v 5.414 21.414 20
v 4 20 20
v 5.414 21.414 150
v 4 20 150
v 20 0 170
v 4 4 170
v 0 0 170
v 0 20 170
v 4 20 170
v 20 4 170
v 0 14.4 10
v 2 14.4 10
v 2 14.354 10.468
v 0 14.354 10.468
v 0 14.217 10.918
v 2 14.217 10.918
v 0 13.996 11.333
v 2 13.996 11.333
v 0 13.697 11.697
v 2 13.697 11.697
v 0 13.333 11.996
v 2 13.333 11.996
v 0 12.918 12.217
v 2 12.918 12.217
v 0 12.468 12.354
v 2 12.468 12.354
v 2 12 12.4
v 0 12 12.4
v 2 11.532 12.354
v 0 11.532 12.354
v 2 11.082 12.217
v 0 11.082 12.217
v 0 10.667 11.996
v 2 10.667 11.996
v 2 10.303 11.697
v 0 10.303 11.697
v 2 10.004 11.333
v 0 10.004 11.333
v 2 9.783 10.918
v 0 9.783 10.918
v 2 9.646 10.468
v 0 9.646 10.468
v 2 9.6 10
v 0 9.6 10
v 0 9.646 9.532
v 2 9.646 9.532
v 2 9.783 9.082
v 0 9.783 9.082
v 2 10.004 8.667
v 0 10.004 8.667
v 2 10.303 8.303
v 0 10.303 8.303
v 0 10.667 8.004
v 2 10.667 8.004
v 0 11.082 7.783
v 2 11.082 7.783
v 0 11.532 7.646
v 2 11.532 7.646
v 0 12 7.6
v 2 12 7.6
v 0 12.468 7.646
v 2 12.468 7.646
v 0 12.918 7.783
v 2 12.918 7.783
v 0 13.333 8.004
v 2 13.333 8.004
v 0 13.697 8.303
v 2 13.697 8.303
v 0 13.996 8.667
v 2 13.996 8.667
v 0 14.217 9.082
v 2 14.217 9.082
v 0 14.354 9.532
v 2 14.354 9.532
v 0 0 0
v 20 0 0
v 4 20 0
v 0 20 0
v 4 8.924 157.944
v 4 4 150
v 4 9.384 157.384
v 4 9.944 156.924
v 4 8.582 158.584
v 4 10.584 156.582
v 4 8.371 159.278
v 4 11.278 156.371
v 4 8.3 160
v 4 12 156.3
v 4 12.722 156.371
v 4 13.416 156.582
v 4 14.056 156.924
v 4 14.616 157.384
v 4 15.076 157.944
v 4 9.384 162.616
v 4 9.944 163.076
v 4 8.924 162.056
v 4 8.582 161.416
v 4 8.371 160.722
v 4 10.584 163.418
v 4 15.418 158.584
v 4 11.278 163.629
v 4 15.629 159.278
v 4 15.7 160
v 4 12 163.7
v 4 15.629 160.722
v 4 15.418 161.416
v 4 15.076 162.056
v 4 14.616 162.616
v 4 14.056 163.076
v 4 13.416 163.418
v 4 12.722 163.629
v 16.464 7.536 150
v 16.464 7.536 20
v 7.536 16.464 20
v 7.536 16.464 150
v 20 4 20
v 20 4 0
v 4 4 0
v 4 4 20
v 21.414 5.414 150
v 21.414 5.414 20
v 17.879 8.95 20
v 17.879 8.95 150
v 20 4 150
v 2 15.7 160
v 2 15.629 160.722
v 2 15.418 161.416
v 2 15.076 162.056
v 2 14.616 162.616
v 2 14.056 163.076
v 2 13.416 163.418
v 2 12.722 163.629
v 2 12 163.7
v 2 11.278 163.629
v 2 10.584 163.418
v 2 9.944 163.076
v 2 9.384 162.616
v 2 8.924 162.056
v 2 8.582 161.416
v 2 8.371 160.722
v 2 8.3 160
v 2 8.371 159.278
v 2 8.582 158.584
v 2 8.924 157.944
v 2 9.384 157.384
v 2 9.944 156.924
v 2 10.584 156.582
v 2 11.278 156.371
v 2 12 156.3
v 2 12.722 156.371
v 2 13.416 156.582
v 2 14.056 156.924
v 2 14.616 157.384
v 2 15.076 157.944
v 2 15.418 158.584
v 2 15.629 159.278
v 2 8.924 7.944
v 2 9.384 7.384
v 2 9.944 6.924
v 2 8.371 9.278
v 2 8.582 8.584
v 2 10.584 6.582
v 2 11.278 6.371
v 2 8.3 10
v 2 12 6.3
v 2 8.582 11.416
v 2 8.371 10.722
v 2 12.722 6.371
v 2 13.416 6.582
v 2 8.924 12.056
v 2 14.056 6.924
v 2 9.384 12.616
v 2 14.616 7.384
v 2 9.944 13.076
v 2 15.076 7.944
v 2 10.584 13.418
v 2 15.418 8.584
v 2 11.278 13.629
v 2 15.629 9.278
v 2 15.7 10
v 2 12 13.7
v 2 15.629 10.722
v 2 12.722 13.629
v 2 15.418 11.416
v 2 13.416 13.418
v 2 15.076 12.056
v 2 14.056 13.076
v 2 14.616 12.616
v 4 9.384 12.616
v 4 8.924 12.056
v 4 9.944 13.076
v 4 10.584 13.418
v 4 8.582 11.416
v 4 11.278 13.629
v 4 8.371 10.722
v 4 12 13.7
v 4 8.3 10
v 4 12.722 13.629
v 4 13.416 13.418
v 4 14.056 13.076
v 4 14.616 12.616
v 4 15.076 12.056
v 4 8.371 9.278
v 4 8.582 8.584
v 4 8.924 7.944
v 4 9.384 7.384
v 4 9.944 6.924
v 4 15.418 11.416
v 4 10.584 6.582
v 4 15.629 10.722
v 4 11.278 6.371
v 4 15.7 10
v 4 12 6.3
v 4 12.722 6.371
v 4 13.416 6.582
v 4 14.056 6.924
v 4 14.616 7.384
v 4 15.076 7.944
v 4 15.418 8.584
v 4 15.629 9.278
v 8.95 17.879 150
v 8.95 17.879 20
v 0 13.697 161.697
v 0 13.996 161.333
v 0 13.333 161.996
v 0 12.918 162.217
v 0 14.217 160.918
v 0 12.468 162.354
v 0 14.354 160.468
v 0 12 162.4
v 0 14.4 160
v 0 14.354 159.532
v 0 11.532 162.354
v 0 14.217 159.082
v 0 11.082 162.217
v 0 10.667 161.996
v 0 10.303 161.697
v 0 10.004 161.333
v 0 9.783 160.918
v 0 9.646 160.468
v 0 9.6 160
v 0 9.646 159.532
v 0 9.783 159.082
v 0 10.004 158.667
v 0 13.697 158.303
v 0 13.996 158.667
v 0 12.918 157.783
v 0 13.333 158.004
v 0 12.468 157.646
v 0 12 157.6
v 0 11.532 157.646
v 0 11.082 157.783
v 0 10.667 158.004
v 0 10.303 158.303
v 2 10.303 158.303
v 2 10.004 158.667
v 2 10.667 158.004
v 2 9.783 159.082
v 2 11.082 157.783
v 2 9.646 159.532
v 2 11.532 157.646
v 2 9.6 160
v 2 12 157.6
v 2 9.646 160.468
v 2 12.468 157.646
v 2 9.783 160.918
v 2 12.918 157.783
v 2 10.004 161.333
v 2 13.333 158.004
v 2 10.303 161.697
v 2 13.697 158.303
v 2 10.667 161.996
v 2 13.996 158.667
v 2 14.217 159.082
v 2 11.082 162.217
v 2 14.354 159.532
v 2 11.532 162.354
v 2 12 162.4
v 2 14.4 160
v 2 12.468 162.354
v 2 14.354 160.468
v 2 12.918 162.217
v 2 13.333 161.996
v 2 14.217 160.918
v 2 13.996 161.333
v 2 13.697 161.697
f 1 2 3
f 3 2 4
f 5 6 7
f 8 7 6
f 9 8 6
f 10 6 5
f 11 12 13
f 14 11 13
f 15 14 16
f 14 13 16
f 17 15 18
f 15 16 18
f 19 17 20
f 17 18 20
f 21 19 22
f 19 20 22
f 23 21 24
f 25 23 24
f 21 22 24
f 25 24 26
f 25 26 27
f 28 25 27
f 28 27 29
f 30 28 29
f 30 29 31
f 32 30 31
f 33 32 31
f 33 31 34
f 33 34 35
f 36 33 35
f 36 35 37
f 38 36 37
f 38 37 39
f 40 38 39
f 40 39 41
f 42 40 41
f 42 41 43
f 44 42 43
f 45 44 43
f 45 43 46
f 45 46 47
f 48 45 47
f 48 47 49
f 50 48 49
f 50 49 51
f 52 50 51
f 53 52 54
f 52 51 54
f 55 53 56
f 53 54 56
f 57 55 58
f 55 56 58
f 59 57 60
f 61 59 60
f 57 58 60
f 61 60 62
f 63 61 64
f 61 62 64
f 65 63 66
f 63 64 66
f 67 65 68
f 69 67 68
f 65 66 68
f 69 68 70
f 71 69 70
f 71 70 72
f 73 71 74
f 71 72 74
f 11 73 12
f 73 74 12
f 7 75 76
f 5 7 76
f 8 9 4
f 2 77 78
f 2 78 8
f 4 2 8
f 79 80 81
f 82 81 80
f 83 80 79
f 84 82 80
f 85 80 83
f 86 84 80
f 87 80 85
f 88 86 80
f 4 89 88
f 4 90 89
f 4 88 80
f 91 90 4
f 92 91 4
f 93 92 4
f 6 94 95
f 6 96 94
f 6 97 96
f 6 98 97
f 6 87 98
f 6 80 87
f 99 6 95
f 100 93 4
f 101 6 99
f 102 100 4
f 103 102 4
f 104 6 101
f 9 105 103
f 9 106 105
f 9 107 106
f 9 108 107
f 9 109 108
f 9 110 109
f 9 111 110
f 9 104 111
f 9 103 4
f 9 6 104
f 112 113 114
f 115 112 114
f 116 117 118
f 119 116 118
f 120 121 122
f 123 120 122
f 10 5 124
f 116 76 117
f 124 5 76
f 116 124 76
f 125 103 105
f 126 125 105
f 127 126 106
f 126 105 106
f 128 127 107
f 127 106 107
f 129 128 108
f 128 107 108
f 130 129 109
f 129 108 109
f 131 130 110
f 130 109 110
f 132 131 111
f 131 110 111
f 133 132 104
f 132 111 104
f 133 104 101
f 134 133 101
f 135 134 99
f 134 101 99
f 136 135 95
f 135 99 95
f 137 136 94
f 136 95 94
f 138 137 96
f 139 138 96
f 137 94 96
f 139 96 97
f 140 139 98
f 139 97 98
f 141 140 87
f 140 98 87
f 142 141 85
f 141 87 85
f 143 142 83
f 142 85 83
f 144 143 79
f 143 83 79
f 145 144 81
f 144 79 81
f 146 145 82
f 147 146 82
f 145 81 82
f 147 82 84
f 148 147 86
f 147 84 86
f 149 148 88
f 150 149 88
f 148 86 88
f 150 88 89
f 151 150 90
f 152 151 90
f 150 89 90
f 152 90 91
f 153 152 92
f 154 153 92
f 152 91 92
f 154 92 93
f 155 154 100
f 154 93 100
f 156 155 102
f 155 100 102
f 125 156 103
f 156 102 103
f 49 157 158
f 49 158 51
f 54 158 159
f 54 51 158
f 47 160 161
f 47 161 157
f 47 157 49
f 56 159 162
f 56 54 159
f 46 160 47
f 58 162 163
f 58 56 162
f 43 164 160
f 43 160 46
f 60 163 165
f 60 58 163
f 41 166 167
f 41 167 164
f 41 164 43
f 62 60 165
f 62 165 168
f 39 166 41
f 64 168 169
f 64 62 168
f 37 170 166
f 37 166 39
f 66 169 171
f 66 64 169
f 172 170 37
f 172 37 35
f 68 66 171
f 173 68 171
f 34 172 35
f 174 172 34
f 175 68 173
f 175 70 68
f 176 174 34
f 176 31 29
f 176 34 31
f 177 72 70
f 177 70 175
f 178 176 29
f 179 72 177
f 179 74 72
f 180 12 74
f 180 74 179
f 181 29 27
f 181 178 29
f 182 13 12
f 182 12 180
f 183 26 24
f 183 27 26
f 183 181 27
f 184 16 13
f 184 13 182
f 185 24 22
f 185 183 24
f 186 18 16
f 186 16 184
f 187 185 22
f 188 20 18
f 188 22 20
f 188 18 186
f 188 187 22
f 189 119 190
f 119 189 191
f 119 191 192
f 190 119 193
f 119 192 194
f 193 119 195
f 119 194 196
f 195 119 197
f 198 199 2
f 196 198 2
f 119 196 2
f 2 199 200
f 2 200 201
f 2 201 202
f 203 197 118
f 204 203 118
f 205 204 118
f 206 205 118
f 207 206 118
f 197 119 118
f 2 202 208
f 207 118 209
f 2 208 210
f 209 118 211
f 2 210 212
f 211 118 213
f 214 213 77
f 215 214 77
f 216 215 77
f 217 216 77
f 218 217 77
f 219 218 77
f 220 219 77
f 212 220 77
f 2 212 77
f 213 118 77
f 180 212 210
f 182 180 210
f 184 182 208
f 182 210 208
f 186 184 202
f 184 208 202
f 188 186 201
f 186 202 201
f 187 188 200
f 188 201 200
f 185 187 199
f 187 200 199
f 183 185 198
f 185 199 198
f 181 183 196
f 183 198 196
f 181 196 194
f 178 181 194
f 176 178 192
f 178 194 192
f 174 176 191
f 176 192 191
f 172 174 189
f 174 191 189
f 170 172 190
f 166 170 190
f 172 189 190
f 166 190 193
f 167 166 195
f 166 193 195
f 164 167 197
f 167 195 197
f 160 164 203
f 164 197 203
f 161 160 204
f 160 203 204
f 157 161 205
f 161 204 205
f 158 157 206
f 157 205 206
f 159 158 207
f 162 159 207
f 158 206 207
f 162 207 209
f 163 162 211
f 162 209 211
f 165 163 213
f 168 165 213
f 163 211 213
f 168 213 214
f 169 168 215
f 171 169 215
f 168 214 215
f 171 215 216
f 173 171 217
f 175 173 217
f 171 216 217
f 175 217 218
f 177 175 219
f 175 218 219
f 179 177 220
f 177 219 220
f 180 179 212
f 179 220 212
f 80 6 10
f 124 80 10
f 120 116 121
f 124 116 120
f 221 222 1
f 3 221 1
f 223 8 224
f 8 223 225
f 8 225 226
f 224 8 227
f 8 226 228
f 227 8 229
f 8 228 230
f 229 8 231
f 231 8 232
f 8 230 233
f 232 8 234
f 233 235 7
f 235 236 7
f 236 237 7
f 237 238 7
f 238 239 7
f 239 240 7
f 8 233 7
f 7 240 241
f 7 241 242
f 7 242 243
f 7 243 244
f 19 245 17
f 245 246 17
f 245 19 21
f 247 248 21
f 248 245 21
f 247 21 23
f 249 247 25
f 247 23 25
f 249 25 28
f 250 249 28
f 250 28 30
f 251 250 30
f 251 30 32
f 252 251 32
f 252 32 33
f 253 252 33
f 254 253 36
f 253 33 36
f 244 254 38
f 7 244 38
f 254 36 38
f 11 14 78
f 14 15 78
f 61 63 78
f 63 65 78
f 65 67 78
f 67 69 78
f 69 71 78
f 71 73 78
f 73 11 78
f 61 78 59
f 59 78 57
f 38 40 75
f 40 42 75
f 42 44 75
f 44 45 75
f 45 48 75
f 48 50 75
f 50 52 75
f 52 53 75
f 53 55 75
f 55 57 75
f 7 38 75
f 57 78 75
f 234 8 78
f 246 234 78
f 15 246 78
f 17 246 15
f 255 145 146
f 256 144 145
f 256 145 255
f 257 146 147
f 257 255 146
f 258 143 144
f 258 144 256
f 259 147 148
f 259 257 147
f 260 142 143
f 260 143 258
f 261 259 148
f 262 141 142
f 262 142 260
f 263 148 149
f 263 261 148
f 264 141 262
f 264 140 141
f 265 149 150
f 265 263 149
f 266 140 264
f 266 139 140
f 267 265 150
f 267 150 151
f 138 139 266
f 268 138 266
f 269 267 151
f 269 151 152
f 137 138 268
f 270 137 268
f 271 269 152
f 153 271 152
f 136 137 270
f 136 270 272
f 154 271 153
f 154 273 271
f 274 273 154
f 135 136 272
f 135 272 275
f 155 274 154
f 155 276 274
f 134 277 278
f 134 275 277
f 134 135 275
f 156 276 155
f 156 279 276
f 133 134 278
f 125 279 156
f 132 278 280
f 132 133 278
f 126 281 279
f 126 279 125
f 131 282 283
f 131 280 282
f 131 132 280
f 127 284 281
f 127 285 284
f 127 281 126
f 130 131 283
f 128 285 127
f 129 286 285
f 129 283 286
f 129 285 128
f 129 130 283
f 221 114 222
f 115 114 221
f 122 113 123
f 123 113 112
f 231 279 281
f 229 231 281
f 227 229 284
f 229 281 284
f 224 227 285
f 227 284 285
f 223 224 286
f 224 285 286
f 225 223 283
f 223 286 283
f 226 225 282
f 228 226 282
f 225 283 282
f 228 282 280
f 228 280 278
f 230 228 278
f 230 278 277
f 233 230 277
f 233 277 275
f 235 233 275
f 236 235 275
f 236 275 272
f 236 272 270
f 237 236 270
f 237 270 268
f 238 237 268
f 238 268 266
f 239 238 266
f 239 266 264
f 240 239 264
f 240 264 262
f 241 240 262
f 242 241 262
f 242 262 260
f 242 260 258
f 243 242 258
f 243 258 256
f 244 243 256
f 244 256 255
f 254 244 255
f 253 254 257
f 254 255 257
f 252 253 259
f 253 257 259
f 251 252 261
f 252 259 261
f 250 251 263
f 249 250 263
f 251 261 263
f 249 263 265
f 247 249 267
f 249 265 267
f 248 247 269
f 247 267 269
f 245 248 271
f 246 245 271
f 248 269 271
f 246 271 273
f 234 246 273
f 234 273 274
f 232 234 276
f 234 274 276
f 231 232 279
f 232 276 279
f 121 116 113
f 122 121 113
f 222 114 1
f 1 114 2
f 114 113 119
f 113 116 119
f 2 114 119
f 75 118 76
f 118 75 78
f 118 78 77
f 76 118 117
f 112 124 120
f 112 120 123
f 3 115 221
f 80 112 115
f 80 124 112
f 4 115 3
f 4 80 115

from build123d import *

# Parameters (mm, degrees)
PAD_DEPTH       = 170
SKETCH001_W     = 16
SKETCH001_H     = 16
POCKET_DEPTH    = 20
POCKET001_DEPTH = 20
SKETCH005_R     = 3.7
POCKET002_DEPTH = 2
SKETCH006_R     = 2.4
POCKET003_DEPTH = 4
SKETCH007_W     = 5
SKETCH007_H     = 130
PAD001_DEPTH    = 2


with BuildPart() as part:
    # Sketch → Pad (new body)
    with BuildSketch(Plane.XY):
        Polygon((0, 20), (0, 0), (20, 0), (20, 4), (4, 20), align=None)
    extrude(amount=PAD_DEPTH)

    # Sketch001 (on Face7 of Pad) → Pocket (cut)
    with BuildSketch(Plane.XY.offset(170)):
        with Locations((12, 12)):
            Rectangle(SKETCH001_W, SKETCH001_H)
    extrude(amount=-POCKET_DEPTH, mode=Mode.SUBTRACT)

    # Sketch004 → Pocket001 (cut)
    with BuildSketch(Plane(origin=(0, 0, 0), x_dir=(1, 0, 0), z_dir=(0, 0, -1))):
        Polygon((4, -4), (4, -20), (20, -4), align=None)
    extrude(amount=-POCKET001_DEPTH, mode=Mode.SUBTRACT)

    # Sketch005 → Pocket002 (cut)
    with BuildSketch(Plane.YZ.offset(4)):
        with Locations((12, 160)):
            Circle(SKETCH005_R)
        with Locations((12, 10)):
            Circle(SKETCH005_R)
    extrude(amount=-POCKET002_DEPTH, mode=Mode.SUBTRACT)

    # Sketch006 → Pocket003 (cut)
    with BuildSketch(Plane.YZ.offset(4)):
        with Locations((12, 10)):
            Circle(SKETCH006_R)
        with Locations((12, 160)):
            Circle(SKETCH006_R)
    extrude(amount=-POCKET003_DEPTH, mode=Mode.SUBTRACT)

    # Sketch007 → Pad001 (join)
    with BuildSketch(Plane(origin=(12, 12, 0), x_dir=(-0.707107, 0.707107, 0), z_dir=(0.707107, 0.707107, 0))):
        with Locations((-8.813708, 85)):
            Rectangle(SKETCH007_W, SKETCH007_H)
        with Locations((8.813708, 85)):
            Rectangle(SKETCH007_W, SKETCH007_H)
    extrude(amount=PAD001_DEPTH)


solid = part.part
